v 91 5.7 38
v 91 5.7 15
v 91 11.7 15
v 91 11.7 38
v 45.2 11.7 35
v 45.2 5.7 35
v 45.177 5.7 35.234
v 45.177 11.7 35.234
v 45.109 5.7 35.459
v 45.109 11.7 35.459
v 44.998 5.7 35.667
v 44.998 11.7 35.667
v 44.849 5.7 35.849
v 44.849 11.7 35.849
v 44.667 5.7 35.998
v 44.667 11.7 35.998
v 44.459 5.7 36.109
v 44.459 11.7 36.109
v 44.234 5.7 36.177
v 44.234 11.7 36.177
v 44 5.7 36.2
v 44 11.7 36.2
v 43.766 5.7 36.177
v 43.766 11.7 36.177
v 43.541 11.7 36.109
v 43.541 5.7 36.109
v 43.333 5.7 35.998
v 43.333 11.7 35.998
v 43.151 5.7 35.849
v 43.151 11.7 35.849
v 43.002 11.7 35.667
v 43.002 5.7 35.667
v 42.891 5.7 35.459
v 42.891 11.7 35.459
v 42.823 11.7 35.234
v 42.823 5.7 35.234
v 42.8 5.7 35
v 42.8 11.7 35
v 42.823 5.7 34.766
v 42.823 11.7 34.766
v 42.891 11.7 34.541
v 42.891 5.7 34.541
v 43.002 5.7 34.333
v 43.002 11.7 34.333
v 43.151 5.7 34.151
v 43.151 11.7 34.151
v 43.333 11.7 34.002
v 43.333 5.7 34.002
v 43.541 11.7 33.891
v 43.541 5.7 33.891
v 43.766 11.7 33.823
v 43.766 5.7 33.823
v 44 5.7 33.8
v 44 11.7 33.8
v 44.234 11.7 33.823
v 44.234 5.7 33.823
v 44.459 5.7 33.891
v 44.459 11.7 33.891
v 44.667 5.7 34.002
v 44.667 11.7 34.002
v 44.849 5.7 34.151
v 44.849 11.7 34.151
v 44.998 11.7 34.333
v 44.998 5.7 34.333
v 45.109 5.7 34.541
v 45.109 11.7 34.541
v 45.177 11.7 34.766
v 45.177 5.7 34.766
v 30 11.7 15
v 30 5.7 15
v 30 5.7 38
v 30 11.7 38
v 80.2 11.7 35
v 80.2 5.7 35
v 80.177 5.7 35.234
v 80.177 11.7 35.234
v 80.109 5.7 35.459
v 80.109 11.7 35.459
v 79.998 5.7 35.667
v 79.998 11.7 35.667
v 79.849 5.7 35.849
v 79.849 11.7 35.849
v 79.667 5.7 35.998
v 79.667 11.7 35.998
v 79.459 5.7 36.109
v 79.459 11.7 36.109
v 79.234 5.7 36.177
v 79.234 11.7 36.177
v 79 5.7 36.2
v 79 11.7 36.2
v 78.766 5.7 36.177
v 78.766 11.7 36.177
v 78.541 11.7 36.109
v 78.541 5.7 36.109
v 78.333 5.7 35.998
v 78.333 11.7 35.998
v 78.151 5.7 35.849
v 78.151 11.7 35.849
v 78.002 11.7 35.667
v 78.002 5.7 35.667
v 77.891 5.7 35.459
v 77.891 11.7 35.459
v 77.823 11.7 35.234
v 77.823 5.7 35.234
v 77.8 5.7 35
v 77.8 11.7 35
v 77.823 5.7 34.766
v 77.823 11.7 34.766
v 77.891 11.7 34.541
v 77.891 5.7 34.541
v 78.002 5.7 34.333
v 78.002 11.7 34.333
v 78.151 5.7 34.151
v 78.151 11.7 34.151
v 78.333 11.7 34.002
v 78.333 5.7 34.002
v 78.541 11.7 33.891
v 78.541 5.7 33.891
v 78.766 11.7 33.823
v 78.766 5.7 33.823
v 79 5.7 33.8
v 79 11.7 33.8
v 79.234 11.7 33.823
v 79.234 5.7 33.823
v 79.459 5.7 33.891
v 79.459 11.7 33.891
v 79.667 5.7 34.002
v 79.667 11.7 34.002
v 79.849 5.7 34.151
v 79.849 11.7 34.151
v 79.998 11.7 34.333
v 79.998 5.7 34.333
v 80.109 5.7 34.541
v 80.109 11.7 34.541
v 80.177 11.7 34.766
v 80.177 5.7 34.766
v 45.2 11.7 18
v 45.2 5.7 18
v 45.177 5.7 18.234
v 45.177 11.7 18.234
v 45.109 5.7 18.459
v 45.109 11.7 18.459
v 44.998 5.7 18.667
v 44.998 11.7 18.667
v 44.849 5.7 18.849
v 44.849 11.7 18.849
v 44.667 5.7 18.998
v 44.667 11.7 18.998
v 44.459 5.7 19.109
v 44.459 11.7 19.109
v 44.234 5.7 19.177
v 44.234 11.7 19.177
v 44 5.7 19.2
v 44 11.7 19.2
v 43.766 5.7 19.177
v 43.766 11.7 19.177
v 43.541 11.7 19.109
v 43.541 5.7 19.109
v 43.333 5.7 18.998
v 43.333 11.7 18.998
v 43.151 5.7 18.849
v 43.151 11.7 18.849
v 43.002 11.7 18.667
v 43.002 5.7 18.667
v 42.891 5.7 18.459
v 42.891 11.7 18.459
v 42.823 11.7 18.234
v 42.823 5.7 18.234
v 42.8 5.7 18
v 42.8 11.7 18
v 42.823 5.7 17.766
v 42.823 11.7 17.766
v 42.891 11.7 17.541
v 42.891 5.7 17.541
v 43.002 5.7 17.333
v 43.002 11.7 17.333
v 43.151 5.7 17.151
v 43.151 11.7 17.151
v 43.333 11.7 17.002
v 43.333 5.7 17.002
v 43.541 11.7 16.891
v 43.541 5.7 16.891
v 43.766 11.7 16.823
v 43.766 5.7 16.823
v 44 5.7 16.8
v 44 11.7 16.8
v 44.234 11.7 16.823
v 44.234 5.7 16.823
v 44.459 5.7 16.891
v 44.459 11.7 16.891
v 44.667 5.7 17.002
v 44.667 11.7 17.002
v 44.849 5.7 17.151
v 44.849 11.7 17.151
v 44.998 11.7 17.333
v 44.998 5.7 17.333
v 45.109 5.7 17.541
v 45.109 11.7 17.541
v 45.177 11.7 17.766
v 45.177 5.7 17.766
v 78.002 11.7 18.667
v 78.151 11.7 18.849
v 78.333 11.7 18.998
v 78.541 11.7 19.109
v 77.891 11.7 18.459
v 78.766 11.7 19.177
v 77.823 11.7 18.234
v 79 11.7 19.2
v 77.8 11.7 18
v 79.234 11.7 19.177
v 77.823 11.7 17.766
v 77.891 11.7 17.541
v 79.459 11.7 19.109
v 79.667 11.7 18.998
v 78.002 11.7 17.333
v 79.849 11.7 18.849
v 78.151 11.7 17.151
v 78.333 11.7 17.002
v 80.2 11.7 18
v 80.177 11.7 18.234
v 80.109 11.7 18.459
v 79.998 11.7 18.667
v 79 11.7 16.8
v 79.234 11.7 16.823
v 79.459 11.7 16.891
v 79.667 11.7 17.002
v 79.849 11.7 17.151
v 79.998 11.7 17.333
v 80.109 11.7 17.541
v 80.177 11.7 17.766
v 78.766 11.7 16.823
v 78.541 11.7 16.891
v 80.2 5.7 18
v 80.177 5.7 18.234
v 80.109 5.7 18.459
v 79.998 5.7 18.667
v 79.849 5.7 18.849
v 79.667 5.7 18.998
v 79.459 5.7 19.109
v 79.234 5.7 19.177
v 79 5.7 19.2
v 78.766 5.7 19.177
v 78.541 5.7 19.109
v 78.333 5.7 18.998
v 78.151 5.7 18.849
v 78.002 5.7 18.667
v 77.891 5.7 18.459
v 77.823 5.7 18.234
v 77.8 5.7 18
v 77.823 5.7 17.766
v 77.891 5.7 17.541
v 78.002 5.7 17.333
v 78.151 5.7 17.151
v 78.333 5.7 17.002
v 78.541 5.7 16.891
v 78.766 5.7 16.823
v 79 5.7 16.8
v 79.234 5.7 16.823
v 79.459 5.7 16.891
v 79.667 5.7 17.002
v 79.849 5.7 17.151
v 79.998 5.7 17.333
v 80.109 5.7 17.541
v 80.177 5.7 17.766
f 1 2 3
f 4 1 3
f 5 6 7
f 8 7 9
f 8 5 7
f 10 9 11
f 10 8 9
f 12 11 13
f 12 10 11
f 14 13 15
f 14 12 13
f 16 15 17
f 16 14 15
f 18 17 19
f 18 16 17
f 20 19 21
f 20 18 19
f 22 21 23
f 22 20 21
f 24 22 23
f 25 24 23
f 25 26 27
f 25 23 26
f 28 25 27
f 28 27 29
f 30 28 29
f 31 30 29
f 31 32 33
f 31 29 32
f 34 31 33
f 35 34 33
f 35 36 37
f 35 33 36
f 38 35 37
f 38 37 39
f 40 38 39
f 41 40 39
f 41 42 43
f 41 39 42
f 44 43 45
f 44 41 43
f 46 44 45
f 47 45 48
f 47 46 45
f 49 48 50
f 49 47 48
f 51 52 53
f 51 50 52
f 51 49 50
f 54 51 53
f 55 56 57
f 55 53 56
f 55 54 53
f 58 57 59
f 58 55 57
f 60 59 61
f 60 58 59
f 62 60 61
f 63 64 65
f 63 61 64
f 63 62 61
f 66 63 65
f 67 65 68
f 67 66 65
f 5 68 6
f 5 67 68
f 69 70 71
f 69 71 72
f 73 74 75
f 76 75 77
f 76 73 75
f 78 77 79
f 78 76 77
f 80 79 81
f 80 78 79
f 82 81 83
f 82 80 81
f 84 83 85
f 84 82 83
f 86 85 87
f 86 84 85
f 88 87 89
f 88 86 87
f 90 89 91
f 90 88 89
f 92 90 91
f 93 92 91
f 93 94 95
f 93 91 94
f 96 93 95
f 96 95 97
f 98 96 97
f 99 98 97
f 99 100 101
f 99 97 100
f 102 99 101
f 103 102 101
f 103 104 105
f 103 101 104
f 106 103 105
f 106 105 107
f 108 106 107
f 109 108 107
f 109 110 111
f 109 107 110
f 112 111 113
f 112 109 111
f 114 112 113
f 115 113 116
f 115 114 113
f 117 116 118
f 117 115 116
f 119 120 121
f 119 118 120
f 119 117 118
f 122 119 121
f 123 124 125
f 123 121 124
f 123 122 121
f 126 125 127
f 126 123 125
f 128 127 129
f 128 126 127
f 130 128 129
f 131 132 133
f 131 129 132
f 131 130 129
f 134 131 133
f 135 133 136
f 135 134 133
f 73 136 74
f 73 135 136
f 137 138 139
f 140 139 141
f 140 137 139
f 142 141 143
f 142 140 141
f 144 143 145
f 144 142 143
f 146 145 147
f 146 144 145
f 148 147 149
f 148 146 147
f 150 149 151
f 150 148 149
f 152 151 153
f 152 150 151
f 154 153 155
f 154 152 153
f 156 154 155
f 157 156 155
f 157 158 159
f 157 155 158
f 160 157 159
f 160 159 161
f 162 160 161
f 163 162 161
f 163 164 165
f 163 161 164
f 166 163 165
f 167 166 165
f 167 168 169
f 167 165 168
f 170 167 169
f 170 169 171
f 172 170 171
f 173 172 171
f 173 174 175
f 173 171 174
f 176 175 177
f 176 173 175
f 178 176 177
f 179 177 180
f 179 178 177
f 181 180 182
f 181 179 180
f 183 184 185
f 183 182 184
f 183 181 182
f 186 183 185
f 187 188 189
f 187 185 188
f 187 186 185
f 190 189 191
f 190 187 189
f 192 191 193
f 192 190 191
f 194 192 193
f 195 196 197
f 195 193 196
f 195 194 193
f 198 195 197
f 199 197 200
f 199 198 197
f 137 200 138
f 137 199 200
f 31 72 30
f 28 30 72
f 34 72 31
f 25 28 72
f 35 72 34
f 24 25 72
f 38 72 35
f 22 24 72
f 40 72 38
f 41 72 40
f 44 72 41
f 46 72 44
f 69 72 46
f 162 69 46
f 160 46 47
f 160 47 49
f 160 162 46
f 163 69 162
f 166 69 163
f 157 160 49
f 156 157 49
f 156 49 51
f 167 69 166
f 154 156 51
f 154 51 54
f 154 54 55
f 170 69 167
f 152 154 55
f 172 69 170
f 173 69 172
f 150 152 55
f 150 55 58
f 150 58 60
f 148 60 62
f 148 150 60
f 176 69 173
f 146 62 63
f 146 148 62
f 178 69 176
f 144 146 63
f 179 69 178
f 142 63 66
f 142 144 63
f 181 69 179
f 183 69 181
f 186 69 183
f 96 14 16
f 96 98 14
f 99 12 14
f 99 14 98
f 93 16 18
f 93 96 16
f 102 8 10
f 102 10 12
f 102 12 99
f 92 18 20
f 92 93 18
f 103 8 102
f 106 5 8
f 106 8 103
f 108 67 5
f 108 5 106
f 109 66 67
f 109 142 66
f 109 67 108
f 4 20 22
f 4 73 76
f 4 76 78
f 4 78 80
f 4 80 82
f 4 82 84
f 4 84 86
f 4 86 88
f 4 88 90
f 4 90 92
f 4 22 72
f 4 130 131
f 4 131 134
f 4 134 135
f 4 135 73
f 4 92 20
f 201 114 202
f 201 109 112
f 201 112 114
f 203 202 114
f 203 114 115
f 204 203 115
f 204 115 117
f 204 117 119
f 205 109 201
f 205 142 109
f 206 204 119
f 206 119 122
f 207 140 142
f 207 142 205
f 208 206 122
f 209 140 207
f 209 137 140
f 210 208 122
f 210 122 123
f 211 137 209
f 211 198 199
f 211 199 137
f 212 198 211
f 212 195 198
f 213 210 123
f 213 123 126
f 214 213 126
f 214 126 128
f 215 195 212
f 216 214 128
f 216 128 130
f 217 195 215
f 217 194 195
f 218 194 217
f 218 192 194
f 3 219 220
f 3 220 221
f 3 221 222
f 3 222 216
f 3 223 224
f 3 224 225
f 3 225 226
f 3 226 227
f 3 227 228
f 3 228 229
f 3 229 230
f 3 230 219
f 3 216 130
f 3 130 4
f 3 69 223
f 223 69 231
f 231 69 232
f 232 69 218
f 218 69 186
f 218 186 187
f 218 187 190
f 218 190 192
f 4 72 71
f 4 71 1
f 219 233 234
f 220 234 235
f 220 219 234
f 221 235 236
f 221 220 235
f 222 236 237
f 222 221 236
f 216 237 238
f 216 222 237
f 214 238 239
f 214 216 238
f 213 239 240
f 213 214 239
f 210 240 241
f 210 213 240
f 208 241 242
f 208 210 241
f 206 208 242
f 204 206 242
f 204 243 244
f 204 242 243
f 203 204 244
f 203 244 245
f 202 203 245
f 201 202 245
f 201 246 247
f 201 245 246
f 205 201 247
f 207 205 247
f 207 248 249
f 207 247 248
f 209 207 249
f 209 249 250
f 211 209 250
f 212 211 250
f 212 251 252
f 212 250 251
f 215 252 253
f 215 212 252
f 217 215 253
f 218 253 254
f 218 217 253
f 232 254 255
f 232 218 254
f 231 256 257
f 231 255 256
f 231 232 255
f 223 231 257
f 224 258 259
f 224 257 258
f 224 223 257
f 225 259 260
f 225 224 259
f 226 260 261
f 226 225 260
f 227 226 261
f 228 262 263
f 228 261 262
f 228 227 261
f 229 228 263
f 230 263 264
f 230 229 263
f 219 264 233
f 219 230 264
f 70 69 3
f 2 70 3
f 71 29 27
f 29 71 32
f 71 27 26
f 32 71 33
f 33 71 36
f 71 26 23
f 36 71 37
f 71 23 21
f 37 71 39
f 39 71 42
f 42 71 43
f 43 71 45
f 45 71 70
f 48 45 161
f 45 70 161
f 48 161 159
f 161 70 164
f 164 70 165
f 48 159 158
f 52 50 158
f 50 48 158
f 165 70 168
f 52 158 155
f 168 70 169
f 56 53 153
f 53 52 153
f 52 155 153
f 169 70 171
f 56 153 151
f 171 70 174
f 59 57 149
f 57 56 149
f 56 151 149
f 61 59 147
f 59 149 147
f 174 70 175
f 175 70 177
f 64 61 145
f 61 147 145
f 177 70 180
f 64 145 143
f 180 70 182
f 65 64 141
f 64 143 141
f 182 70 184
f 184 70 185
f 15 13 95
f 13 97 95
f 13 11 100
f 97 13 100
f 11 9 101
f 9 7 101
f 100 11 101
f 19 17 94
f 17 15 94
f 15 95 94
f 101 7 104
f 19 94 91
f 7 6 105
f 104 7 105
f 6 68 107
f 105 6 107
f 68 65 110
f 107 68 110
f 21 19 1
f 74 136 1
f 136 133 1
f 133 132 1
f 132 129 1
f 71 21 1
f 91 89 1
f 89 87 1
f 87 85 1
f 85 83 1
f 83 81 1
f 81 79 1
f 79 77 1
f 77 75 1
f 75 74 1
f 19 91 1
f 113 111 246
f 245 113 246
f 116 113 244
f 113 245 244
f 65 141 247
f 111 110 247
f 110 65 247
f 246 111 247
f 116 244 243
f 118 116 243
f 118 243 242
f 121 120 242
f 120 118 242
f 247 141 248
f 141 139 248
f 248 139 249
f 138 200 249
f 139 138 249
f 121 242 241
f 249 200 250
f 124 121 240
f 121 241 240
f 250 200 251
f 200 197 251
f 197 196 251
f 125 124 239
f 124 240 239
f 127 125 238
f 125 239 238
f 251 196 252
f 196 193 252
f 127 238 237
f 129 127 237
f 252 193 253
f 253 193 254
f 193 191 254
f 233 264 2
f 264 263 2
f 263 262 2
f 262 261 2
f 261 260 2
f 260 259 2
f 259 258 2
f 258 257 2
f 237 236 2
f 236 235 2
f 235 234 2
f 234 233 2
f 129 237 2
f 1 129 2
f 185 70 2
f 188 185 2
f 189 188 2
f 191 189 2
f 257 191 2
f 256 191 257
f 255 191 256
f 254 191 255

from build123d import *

# Parameters (mm, degrees)
CYLINDER001_R     = 1.2
CYLINDER001_DEPTH = 10
CYLINDER002_R     = 1.2
CYLINDER002_DEPTH = 10
CYLINDER003_R     = 1.2
CYLINDER003_DEPTH = 10
CYLINDER_R        = 1.2
CYLINDER_DEPTH    = 10
BOX002_W          = 61
BOX002_H          = 6
BOX002_DEPTH      = 23


with BuildPart() as m2s001:
    # Cylinder001 → Cylinder001 (new body)
    with BuildSketch(Plane(origin=(14, 0, 20), x_dir=(1, 0, 0), z_dir=(0, -1, 0))):
        Circle(CYLINDER001_R)
    extrude(amount=CYLINDER001_DEPTH)


with BuildPart() as m2s002:
    # Cylinder002 → Cylinder002 (new body)
    with BuildSketch(Plane(origin=(49, 0, 20), x_dir=(1, 0, 0), z_dir=(0, -1, 0))):
        Circle(CYLINDER002_R)
    extrude(amount=CYLINDER002_DEPTH)


with BuildPart() as m2s003:
    # Cylinder003 → Cylinder003 (new body)
    with BuildSketch(Plane(origin=(49, 0, 3), x_dir=(1, 0, 0), z_dir=(0, -1, 0))):
        Circle(CYLINDER003_R)
    extrude(amount=CYLINDER003_DEPTH)


with BuildPart() as e5minicuts:
    # Cylinder → Cylinder (new body)
    with BuildSketch(Plane(origin=(14, 0, 3), x_dir=(1, 0, 0), z_dir=(0, -1, 0))):
        Circle(CYLINDER_R)
    extrude(amount=CYLINDER_DEPTH)

    # Fusion: union m2s001, m2s002, m2s003
    add(m2s001.part)
    add(m2s002.part)
    add(m2s003.part)


with BuildPart() as e5minicuts_1:
    # Fusion placement: moved
    add(e5minicuts.part.moved(Location((0, 6, 0))))


with BuildPart() as e5mini:
    # Box002 → Box002 (new body)
    with BuildSketch(Plane.XY):
        with Locations((30.5, 3)):
            Rectangle(BOX002_W, BOX002_H)
    extrude(amount=BOX002_DEPTH)

    # Cut: cut e5MiniCuts
    add(e5minicuts_1.part, mode=Mode.SUBTRACT)


with BuildPart() as e5mini_1:
    # Cut placement: moved
    add(e5mini.part.moved(Location((30, 5.7, 15))))


solid = e5mini_1.part
